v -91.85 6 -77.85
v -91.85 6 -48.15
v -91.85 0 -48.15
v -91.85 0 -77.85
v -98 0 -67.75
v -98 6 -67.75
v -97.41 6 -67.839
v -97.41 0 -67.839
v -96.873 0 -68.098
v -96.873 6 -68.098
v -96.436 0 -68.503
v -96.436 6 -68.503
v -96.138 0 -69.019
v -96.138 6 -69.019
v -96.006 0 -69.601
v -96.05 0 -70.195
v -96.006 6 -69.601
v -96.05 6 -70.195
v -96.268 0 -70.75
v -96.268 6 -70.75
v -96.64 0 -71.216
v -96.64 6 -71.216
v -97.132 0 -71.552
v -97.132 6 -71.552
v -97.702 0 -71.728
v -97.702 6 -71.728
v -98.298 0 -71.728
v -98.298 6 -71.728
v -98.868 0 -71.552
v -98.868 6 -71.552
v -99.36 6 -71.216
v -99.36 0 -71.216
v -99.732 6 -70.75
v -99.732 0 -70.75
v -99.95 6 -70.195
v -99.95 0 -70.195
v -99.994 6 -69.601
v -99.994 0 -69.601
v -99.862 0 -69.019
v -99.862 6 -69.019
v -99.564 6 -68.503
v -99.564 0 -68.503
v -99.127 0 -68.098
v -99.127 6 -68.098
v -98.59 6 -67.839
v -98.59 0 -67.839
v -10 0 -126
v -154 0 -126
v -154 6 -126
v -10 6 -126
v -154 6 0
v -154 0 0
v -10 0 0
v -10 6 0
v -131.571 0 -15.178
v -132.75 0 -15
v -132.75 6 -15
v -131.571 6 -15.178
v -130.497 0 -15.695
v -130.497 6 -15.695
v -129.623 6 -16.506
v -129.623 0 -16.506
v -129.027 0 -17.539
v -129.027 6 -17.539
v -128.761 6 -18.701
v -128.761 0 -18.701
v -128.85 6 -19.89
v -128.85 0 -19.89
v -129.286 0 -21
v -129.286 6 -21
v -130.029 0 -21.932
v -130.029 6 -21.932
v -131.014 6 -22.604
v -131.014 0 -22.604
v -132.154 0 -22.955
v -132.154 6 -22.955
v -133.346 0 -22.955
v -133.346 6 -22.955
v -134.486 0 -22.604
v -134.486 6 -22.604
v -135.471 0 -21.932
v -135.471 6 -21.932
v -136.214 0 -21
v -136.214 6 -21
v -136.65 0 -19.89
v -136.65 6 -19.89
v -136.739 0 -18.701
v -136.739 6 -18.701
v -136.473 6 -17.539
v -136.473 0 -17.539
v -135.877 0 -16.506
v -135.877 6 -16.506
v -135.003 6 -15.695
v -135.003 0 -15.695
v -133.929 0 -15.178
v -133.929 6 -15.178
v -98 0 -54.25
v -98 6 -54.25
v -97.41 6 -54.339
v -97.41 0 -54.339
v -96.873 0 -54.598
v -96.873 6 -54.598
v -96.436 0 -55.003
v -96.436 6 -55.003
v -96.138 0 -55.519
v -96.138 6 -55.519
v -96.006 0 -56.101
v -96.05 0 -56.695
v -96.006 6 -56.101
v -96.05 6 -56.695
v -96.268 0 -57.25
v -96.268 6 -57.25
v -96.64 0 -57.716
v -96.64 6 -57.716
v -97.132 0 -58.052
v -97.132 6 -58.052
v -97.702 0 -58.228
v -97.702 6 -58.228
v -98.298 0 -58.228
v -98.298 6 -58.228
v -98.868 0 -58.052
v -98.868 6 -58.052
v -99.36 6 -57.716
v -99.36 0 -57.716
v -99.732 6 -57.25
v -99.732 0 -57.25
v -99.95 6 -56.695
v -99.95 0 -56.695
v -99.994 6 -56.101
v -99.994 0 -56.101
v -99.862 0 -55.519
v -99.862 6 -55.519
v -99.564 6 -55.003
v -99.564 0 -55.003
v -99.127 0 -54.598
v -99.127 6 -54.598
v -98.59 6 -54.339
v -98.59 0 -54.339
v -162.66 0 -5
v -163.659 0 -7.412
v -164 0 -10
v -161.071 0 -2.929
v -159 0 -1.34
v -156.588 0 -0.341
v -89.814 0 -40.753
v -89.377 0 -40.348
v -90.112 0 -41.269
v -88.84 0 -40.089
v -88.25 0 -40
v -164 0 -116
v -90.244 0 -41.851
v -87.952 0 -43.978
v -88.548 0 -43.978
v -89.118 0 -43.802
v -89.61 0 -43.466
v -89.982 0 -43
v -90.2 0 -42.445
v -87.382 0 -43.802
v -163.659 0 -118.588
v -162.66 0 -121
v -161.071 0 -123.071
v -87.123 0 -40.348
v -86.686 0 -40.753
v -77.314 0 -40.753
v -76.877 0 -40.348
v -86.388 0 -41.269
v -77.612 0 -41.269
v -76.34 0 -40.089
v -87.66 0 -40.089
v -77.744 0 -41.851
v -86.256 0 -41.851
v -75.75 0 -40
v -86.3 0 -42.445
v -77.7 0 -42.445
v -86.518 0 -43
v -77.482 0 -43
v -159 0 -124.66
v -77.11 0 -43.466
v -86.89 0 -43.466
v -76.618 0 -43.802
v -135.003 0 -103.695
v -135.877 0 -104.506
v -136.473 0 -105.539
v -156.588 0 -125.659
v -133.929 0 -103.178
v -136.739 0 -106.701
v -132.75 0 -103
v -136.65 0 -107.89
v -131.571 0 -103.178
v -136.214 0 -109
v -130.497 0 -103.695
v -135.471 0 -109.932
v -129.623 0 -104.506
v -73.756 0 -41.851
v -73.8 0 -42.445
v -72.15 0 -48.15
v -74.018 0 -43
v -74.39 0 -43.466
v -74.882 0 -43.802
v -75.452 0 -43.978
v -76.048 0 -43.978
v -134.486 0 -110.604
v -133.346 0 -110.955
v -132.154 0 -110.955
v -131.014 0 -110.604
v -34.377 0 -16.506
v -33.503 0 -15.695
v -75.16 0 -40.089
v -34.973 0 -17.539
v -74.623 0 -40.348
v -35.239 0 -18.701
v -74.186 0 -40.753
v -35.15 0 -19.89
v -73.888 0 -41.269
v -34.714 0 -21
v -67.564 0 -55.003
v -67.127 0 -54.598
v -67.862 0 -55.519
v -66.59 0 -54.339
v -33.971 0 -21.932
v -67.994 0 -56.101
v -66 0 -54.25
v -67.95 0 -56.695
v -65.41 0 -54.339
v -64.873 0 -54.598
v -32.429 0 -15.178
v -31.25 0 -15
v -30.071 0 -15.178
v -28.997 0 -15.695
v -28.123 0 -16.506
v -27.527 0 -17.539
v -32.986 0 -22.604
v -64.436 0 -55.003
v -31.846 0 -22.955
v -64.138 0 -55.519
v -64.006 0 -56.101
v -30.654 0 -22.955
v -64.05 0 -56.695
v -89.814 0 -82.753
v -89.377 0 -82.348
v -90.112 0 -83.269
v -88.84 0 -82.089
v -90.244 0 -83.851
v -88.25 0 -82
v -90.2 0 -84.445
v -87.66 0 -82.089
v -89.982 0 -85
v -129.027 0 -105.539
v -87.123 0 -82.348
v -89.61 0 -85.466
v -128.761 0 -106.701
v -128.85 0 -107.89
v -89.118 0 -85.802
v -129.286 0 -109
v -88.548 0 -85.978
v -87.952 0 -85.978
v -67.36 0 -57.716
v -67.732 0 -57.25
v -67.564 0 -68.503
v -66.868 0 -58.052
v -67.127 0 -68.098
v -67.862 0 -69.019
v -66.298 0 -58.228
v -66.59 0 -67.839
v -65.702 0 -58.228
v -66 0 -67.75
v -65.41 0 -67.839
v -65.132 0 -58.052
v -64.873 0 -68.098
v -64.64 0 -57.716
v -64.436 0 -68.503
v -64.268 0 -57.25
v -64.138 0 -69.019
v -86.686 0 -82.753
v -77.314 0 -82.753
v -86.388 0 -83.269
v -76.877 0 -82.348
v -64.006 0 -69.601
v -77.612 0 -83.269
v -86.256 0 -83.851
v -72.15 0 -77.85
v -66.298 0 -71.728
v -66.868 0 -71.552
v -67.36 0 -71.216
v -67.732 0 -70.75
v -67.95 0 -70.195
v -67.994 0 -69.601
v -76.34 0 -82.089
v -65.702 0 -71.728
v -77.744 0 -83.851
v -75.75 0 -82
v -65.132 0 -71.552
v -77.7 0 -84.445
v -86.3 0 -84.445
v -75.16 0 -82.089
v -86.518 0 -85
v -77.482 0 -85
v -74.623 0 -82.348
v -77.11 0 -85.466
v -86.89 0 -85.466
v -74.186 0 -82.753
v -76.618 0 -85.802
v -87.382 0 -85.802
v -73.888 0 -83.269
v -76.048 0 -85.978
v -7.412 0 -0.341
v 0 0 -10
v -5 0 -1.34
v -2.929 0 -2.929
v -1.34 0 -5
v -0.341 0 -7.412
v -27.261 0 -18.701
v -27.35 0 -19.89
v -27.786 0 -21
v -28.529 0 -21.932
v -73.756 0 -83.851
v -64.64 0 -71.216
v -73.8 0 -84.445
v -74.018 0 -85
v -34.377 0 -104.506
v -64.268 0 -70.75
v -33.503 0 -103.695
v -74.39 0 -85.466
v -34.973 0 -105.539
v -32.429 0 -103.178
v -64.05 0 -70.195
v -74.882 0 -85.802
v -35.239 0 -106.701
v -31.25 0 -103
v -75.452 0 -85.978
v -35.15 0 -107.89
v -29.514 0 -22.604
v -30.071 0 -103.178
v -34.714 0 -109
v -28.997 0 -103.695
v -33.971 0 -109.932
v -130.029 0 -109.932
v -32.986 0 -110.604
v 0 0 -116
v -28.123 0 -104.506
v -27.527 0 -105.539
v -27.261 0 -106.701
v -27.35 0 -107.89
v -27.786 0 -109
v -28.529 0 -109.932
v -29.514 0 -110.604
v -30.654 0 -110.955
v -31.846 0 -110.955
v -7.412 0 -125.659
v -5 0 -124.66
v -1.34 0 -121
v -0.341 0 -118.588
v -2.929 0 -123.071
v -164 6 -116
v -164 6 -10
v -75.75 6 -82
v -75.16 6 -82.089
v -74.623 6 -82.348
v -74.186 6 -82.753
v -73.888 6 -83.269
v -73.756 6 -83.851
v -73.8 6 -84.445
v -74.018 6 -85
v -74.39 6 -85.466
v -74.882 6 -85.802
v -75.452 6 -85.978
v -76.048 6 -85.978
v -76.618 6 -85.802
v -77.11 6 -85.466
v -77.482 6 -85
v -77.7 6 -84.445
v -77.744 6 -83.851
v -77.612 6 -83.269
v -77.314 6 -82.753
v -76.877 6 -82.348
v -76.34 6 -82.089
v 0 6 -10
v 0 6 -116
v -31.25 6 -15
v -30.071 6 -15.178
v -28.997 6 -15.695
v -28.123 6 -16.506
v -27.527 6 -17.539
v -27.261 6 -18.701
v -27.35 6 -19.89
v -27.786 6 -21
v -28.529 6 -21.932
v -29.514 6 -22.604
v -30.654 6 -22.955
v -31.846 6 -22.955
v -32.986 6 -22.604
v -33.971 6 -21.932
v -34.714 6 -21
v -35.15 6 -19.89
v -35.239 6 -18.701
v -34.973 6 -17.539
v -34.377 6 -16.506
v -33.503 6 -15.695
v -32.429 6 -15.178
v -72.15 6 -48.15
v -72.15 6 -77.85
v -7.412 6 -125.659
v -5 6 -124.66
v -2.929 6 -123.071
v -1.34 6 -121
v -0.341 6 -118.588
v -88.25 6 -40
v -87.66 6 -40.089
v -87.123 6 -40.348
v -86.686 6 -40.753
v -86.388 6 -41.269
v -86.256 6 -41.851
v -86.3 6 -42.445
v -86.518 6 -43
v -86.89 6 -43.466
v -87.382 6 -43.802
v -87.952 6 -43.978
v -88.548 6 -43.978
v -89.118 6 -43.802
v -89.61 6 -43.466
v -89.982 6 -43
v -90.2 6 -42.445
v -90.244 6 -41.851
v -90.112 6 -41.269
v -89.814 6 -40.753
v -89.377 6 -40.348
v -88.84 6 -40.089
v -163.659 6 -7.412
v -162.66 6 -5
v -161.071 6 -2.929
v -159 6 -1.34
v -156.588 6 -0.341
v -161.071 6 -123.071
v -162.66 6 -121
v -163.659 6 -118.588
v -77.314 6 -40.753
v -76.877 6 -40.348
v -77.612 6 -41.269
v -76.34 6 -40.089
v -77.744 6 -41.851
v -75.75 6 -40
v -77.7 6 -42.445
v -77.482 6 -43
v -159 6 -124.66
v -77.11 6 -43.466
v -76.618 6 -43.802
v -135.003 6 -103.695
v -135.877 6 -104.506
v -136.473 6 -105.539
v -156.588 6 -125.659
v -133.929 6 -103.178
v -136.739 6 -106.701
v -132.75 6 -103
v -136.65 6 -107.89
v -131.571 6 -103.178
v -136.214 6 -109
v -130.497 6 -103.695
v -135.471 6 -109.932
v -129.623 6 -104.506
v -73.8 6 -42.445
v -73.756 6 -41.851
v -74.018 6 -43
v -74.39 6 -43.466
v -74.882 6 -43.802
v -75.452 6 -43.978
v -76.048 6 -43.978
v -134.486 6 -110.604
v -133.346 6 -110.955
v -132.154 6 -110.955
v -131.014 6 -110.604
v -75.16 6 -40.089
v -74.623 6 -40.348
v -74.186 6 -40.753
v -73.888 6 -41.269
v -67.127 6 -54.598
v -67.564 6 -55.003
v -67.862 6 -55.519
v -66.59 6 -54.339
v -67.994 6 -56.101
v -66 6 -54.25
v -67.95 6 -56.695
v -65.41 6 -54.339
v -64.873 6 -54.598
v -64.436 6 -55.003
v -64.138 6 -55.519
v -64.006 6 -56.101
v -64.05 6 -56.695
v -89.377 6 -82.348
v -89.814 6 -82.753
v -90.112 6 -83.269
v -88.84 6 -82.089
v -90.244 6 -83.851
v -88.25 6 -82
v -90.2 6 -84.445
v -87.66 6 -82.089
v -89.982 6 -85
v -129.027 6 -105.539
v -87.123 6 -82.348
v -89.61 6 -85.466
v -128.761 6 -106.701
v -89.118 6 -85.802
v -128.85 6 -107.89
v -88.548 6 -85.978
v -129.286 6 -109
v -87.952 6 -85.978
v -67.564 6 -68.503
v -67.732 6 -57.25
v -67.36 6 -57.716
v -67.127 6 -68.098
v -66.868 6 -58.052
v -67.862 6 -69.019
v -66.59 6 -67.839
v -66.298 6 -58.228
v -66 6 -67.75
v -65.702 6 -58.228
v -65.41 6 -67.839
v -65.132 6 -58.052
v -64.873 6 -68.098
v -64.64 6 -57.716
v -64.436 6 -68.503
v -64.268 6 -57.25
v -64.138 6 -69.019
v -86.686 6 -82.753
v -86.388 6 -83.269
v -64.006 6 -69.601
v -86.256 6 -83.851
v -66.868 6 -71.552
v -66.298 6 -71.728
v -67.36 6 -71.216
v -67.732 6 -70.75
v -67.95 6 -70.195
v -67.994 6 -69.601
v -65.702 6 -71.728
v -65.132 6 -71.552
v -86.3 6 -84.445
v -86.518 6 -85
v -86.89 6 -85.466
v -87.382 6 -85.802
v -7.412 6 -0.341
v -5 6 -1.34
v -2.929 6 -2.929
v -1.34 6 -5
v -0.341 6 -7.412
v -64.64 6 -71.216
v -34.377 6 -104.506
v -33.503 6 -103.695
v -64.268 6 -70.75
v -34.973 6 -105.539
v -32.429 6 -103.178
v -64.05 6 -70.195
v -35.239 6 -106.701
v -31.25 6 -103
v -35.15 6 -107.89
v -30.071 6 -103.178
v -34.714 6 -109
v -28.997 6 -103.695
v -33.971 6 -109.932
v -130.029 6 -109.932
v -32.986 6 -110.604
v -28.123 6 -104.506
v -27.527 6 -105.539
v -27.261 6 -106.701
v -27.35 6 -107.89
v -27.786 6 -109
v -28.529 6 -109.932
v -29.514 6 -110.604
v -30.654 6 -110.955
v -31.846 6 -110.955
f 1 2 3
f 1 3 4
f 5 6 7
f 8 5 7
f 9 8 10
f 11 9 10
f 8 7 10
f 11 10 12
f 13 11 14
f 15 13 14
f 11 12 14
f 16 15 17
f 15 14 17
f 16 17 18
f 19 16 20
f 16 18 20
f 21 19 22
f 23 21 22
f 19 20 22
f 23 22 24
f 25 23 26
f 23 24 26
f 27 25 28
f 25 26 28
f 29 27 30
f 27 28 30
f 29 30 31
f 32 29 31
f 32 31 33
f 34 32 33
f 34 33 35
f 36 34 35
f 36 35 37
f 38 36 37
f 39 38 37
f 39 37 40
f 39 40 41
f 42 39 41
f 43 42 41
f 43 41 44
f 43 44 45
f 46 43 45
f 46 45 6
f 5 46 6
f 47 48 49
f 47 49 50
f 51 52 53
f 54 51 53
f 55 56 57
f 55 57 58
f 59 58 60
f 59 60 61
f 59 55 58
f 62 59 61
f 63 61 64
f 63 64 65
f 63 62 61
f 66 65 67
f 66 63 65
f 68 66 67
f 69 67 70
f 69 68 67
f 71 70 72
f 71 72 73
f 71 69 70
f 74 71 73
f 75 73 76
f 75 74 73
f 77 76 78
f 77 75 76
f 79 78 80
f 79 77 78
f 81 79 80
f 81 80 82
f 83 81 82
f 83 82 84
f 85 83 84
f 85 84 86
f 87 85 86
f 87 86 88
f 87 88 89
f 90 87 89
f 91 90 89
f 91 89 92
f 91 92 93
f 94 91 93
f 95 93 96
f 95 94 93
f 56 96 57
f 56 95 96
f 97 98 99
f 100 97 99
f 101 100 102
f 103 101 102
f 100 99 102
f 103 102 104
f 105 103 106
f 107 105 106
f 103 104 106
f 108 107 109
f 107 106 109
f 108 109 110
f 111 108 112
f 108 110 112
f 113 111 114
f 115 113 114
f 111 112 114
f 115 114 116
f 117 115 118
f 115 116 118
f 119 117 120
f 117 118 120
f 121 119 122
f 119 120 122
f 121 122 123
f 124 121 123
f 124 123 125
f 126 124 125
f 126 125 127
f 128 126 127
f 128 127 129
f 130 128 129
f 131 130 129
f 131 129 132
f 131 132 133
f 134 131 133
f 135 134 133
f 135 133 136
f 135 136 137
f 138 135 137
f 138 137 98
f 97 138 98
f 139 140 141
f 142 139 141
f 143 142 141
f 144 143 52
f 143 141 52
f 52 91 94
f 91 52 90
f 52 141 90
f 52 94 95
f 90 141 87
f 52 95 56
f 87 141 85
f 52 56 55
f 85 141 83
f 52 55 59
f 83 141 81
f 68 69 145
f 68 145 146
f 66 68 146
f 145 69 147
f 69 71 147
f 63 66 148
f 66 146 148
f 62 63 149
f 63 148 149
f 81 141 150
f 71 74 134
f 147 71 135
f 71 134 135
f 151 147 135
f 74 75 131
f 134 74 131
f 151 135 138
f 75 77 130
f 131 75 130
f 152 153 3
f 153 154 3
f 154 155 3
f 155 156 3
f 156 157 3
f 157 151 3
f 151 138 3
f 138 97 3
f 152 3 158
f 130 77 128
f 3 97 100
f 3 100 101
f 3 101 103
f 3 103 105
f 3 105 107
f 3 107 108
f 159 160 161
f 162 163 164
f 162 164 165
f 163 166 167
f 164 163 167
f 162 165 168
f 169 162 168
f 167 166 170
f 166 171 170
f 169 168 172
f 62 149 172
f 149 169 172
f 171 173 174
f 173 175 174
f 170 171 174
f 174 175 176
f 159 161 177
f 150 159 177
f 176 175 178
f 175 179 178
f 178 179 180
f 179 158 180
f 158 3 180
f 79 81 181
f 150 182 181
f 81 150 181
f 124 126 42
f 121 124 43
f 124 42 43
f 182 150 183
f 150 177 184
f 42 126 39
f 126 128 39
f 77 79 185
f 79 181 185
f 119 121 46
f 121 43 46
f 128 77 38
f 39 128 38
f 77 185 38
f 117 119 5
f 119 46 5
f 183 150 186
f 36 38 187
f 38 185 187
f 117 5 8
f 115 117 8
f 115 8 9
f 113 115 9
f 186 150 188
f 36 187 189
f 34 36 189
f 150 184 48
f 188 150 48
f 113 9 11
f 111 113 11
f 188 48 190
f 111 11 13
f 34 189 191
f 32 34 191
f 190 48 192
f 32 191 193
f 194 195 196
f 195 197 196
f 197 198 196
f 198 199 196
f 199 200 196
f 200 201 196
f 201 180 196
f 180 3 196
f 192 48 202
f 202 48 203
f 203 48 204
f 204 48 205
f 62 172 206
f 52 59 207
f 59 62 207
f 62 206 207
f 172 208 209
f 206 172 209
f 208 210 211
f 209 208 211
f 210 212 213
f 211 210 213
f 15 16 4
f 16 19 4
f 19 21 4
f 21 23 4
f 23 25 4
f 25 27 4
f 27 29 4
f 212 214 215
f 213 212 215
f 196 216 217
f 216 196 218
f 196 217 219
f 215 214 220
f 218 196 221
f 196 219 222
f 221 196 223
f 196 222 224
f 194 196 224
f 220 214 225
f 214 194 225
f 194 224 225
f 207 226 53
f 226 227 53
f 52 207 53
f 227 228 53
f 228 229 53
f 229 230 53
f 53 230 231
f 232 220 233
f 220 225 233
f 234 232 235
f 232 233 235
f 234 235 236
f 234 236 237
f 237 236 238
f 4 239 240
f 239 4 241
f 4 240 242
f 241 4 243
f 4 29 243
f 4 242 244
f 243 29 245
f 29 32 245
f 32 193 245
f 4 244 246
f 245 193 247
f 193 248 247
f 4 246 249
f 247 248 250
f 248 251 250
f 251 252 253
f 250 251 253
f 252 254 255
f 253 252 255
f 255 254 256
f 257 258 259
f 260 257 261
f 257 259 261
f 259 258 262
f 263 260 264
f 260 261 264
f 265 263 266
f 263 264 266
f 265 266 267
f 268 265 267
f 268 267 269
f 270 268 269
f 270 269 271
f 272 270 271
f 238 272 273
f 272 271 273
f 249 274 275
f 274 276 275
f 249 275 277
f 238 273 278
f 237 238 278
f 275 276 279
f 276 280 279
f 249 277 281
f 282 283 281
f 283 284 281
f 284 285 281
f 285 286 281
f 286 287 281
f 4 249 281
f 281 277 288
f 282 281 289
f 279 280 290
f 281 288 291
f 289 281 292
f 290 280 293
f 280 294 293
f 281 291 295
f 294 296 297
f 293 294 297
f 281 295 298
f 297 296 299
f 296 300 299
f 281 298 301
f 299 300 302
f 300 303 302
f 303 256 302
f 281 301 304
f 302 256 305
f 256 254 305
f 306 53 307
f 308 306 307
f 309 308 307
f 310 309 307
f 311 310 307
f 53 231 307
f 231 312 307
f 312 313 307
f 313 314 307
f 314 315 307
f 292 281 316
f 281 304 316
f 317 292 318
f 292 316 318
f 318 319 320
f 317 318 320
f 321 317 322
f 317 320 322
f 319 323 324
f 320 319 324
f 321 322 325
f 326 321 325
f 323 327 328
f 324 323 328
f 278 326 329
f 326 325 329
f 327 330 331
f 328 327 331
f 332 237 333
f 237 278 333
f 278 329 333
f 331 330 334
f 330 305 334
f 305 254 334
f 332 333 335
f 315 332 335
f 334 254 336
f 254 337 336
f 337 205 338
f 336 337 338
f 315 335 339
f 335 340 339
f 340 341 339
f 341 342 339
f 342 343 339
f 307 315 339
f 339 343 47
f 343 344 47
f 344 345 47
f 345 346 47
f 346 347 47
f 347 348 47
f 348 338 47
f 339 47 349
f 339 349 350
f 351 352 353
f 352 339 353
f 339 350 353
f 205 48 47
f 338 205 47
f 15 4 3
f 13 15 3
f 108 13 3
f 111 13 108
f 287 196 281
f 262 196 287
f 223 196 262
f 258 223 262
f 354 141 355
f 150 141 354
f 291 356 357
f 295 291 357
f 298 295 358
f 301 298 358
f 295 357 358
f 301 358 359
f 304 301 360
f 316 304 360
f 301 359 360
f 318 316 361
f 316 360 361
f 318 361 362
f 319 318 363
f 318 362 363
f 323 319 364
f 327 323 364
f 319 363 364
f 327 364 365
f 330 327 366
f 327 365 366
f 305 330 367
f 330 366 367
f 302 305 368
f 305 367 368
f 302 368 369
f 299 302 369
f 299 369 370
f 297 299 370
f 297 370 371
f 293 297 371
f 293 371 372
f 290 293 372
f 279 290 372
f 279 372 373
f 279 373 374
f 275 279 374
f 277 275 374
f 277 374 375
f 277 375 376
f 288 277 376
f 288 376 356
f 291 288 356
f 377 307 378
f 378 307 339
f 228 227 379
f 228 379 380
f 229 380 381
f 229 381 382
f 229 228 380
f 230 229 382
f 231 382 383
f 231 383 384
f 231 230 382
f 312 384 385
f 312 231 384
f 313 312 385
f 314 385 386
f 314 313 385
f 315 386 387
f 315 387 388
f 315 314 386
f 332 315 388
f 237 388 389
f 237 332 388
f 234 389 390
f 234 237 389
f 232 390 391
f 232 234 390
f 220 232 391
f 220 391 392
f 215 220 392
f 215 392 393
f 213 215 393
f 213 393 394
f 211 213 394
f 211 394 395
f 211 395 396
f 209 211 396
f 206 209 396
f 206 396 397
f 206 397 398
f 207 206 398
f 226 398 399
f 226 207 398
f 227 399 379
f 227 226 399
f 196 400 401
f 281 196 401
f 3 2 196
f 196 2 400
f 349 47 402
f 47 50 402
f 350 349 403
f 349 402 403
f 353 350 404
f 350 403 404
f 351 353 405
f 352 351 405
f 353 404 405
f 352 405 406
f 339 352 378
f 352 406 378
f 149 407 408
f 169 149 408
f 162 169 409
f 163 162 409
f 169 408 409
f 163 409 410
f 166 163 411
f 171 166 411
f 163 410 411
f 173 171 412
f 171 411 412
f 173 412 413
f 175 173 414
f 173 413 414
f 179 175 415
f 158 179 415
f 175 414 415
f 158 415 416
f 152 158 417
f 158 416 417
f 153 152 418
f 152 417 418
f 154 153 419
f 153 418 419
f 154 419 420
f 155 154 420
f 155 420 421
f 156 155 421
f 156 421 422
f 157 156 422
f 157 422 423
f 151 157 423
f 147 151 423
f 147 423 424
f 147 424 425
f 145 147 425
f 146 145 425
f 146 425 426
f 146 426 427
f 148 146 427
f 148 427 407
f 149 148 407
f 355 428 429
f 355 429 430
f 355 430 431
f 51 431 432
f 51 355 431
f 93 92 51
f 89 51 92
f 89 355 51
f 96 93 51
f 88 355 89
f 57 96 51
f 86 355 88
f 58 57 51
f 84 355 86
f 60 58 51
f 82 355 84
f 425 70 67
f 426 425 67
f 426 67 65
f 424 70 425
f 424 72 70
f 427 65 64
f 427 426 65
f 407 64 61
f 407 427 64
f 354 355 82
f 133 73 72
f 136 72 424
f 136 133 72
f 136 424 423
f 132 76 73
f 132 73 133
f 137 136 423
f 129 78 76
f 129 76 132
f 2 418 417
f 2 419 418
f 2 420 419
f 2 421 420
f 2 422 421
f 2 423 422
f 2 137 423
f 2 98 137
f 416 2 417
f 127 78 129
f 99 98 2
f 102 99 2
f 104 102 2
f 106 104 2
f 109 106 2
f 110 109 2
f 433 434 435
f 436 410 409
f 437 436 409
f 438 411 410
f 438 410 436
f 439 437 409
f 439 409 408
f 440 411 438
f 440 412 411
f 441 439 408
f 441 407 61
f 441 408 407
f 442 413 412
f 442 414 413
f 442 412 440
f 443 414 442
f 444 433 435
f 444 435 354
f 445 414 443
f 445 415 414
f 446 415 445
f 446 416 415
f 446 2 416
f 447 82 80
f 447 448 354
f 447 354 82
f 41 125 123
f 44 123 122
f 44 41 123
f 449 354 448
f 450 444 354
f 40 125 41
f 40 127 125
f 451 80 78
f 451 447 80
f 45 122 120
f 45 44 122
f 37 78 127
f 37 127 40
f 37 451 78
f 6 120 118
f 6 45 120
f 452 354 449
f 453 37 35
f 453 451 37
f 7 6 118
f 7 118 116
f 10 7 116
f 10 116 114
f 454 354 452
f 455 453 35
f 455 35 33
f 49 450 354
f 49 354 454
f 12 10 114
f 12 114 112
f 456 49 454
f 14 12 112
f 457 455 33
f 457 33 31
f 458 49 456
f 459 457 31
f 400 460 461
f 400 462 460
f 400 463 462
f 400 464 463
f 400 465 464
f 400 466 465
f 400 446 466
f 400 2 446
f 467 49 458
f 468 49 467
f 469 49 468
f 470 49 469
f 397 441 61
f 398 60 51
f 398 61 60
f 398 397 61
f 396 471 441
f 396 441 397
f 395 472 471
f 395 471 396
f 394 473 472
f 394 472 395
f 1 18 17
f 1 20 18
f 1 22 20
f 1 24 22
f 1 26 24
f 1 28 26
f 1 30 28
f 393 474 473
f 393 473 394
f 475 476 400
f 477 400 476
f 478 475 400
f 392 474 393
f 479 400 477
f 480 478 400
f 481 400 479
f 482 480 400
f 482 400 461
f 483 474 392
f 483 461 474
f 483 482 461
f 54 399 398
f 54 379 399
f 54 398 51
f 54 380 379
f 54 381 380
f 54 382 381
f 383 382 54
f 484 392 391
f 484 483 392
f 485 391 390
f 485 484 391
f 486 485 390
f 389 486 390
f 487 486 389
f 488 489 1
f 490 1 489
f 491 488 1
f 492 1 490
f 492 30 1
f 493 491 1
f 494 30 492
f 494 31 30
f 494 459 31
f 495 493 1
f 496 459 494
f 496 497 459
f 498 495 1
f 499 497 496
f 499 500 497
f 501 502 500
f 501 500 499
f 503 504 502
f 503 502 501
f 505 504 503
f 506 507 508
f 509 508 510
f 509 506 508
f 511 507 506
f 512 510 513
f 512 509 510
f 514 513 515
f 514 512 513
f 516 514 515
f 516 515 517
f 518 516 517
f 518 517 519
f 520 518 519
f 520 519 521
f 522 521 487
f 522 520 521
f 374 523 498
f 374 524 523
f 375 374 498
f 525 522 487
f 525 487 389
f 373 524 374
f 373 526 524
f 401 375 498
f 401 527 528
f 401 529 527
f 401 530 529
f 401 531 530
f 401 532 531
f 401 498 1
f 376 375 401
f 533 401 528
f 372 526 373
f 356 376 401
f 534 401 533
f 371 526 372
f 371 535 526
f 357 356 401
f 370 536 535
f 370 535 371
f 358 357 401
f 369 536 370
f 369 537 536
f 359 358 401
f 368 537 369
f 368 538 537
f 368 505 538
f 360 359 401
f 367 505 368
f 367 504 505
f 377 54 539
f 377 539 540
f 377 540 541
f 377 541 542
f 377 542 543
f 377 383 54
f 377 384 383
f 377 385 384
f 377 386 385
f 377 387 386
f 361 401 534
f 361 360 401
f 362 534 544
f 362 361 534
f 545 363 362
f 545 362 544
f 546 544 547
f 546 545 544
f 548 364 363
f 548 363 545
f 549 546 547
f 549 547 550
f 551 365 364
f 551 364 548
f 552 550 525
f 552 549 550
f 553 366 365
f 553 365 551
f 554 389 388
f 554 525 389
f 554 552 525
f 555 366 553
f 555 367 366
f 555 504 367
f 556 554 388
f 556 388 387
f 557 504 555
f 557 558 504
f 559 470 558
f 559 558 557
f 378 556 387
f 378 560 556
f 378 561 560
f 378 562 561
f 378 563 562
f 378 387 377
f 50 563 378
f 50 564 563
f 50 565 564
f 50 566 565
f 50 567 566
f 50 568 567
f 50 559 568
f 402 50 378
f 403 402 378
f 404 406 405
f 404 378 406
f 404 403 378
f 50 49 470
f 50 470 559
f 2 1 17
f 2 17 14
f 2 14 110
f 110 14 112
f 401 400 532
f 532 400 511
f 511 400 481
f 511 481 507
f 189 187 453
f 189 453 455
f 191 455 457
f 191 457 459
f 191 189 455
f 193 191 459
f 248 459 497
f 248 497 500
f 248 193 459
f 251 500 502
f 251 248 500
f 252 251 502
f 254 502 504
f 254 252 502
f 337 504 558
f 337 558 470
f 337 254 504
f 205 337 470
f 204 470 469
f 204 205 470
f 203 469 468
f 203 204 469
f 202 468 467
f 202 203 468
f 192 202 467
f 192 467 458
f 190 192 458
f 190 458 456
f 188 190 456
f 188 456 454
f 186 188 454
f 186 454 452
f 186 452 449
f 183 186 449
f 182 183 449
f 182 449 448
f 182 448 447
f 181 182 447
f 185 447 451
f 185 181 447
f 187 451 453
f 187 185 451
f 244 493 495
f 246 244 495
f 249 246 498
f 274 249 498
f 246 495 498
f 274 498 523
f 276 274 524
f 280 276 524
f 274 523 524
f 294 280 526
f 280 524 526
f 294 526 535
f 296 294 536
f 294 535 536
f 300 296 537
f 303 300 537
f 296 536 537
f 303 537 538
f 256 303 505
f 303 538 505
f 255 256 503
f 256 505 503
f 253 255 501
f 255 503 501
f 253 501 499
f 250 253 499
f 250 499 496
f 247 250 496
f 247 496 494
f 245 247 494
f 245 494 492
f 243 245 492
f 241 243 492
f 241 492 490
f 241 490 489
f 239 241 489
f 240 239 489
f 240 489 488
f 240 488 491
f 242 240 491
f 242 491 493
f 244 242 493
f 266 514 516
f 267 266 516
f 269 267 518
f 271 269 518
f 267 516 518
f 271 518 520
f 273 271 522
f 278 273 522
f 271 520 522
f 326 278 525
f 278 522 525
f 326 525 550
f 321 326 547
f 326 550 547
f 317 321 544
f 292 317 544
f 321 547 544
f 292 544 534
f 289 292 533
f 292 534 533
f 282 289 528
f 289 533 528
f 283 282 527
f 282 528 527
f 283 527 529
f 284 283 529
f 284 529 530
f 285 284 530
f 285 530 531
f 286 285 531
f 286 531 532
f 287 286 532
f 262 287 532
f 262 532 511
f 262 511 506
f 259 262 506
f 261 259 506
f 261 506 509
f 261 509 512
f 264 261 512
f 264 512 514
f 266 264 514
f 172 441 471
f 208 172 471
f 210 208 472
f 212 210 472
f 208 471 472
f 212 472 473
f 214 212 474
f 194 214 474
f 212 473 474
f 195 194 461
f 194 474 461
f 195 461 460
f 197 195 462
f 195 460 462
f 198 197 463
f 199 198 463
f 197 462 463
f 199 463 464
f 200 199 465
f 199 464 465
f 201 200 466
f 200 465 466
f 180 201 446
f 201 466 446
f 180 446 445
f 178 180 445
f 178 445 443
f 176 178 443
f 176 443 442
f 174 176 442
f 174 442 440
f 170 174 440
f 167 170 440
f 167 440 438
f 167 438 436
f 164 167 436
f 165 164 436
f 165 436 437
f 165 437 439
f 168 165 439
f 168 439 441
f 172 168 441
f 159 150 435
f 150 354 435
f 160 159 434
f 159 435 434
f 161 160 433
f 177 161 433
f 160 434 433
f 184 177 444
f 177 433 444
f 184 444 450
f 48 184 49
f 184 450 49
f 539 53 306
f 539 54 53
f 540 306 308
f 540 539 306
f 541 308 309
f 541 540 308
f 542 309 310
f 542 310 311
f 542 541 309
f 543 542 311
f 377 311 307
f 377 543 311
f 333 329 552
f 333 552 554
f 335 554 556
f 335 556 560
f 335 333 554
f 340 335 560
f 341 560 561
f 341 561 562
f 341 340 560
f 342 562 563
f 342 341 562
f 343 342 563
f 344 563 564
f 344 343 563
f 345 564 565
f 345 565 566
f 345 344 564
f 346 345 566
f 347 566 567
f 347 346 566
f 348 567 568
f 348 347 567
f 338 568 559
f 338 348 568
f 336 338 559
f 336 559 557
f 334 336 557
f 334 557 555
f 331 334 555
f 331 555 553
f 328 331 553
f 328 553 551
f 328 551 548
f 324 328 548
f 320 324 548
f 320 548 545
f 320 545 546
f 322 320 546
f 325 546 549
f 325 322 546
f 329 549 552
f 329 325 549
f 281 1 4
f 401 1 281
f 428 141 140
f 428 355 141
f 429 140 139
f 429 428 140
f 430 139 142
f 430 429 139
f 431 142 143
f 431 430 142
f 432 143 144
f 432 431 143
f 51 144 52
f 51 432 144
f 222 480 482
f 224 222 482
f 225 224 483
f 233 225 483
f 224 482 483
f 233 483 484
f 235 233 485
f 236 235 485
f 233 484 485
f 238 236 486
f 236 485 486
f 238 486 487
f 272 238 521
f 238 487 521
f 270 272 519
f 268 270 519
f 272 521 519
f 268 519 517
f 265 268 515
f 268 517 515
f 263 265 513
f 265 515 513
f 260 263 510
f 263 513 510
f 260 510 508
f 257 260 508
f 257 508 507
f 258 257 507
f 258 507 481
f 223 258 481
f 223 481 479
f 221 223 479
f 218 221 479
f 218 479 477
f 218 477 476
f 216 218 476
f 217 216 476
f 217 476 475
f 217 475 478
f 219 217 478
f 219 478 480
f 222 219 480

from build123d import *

# Parameters (mm, degrees)
SKETCH1_W           = 164
SKETCH1_H           = 126
SKETCH1_R           = 4
BOSS_EXTRUDE1_DEPTH = 6
FILLET1_R           = 10
SKETCH2_R           = 2
SKETCH2_W           = 19.7
SKETCH2_H           = 29.7
CUT_EXTRUDE1_DEPTH  = 207.900942482


with BuildPart() as part:
    # Sketch1 → Boss-Extrude1 (new body)
    with BuildSketch(Plane(origin=(0, 0, 0), x_dir=(1, 0, 0), z_dir=(0, 1, 0))):
        with Locations((-82, 63)):
            Rectangle(SKETCH1_W, SKETCH1_H)
        with Locations(Location((-132.75, 107, 0), (0, 0, 270))):
            Circle(SKETCH1_R, mode=Mode.SUBTRACT)
        with Locations(Location((-31.25, 107, 0), (0, 0, 270))):
            Circle(SKETCH1_R, mode=Mode.SUBTRACT)
        with Locations(Location((-132.75, 19, 0), (0, 0, 270))):
            Circle(SKETCH1_R, mode=Mode.SUBTRACT)
        with Locations(Location((-31.25, 19, 0), (0, 0, 270))):
            Circle(SKETCH1_R, mode=Mode.SUBTRACT)
    extrude(amount=BOSS_EXTRUDE1_DEPTH)

    # Fillet1
    fillet1_edges = [part.edges().sort_by_distance(p)[0] for p in [
        (0, 3, 0),
        (-164, 3, 0),
        (-164, 3, -126),
        (0, 3, -126),
    ]]
    fillet(fillet1_edges, radius=FILLET1_R)

    # Sketch2 → Cut-Extrude1 (cut, through all)
    with BuildSketch(Plane(origin=(0, 6, 0), x_dir=(1, 0, 0), z_dir=(0, 1, 0))):
        with Locations(Location((-88.25, 84, 0), (0, 0, 270))):
            Circle(SKETCH2_R)
        with Locations(Location((-75.75, 84, 0), (0, 0, 270))):
            Circle(SKETCH2_R)
        with Locations(Location((-98, 69.75, 0), (0, 0, 270))):
            Circle(SKETCH2_R)
        with Locations(Location((-98, 56.25, 0), (0, 0, 270))):
            Circle(SKETCH2_R)
        with Locations(Location((-88.25, 42, 0), (0, 0, 270))):
            Circle(SKETCH2_R)
        with Locations(Location((-75.75, 42, 0), (0, 0, 270))):
            Circle(SKETCH2_R)
        with Locations(Location((-66, 56.25, 0), (0, 0, 270))):
            Circle(SKETCH2_R)
        with Locations(Location((-66, 69.75, 0), (0, 0, 270))):
            Circle(SKETCH2_R)
        with Locations((-82, 63)):
            Rectangle(SKETCH2_W, SKETCH2_H)
    extrude(amount=-CUT_EXTRUDE1_DEPTH, mode=Mode.SUBTRACT)


solid = part.part
